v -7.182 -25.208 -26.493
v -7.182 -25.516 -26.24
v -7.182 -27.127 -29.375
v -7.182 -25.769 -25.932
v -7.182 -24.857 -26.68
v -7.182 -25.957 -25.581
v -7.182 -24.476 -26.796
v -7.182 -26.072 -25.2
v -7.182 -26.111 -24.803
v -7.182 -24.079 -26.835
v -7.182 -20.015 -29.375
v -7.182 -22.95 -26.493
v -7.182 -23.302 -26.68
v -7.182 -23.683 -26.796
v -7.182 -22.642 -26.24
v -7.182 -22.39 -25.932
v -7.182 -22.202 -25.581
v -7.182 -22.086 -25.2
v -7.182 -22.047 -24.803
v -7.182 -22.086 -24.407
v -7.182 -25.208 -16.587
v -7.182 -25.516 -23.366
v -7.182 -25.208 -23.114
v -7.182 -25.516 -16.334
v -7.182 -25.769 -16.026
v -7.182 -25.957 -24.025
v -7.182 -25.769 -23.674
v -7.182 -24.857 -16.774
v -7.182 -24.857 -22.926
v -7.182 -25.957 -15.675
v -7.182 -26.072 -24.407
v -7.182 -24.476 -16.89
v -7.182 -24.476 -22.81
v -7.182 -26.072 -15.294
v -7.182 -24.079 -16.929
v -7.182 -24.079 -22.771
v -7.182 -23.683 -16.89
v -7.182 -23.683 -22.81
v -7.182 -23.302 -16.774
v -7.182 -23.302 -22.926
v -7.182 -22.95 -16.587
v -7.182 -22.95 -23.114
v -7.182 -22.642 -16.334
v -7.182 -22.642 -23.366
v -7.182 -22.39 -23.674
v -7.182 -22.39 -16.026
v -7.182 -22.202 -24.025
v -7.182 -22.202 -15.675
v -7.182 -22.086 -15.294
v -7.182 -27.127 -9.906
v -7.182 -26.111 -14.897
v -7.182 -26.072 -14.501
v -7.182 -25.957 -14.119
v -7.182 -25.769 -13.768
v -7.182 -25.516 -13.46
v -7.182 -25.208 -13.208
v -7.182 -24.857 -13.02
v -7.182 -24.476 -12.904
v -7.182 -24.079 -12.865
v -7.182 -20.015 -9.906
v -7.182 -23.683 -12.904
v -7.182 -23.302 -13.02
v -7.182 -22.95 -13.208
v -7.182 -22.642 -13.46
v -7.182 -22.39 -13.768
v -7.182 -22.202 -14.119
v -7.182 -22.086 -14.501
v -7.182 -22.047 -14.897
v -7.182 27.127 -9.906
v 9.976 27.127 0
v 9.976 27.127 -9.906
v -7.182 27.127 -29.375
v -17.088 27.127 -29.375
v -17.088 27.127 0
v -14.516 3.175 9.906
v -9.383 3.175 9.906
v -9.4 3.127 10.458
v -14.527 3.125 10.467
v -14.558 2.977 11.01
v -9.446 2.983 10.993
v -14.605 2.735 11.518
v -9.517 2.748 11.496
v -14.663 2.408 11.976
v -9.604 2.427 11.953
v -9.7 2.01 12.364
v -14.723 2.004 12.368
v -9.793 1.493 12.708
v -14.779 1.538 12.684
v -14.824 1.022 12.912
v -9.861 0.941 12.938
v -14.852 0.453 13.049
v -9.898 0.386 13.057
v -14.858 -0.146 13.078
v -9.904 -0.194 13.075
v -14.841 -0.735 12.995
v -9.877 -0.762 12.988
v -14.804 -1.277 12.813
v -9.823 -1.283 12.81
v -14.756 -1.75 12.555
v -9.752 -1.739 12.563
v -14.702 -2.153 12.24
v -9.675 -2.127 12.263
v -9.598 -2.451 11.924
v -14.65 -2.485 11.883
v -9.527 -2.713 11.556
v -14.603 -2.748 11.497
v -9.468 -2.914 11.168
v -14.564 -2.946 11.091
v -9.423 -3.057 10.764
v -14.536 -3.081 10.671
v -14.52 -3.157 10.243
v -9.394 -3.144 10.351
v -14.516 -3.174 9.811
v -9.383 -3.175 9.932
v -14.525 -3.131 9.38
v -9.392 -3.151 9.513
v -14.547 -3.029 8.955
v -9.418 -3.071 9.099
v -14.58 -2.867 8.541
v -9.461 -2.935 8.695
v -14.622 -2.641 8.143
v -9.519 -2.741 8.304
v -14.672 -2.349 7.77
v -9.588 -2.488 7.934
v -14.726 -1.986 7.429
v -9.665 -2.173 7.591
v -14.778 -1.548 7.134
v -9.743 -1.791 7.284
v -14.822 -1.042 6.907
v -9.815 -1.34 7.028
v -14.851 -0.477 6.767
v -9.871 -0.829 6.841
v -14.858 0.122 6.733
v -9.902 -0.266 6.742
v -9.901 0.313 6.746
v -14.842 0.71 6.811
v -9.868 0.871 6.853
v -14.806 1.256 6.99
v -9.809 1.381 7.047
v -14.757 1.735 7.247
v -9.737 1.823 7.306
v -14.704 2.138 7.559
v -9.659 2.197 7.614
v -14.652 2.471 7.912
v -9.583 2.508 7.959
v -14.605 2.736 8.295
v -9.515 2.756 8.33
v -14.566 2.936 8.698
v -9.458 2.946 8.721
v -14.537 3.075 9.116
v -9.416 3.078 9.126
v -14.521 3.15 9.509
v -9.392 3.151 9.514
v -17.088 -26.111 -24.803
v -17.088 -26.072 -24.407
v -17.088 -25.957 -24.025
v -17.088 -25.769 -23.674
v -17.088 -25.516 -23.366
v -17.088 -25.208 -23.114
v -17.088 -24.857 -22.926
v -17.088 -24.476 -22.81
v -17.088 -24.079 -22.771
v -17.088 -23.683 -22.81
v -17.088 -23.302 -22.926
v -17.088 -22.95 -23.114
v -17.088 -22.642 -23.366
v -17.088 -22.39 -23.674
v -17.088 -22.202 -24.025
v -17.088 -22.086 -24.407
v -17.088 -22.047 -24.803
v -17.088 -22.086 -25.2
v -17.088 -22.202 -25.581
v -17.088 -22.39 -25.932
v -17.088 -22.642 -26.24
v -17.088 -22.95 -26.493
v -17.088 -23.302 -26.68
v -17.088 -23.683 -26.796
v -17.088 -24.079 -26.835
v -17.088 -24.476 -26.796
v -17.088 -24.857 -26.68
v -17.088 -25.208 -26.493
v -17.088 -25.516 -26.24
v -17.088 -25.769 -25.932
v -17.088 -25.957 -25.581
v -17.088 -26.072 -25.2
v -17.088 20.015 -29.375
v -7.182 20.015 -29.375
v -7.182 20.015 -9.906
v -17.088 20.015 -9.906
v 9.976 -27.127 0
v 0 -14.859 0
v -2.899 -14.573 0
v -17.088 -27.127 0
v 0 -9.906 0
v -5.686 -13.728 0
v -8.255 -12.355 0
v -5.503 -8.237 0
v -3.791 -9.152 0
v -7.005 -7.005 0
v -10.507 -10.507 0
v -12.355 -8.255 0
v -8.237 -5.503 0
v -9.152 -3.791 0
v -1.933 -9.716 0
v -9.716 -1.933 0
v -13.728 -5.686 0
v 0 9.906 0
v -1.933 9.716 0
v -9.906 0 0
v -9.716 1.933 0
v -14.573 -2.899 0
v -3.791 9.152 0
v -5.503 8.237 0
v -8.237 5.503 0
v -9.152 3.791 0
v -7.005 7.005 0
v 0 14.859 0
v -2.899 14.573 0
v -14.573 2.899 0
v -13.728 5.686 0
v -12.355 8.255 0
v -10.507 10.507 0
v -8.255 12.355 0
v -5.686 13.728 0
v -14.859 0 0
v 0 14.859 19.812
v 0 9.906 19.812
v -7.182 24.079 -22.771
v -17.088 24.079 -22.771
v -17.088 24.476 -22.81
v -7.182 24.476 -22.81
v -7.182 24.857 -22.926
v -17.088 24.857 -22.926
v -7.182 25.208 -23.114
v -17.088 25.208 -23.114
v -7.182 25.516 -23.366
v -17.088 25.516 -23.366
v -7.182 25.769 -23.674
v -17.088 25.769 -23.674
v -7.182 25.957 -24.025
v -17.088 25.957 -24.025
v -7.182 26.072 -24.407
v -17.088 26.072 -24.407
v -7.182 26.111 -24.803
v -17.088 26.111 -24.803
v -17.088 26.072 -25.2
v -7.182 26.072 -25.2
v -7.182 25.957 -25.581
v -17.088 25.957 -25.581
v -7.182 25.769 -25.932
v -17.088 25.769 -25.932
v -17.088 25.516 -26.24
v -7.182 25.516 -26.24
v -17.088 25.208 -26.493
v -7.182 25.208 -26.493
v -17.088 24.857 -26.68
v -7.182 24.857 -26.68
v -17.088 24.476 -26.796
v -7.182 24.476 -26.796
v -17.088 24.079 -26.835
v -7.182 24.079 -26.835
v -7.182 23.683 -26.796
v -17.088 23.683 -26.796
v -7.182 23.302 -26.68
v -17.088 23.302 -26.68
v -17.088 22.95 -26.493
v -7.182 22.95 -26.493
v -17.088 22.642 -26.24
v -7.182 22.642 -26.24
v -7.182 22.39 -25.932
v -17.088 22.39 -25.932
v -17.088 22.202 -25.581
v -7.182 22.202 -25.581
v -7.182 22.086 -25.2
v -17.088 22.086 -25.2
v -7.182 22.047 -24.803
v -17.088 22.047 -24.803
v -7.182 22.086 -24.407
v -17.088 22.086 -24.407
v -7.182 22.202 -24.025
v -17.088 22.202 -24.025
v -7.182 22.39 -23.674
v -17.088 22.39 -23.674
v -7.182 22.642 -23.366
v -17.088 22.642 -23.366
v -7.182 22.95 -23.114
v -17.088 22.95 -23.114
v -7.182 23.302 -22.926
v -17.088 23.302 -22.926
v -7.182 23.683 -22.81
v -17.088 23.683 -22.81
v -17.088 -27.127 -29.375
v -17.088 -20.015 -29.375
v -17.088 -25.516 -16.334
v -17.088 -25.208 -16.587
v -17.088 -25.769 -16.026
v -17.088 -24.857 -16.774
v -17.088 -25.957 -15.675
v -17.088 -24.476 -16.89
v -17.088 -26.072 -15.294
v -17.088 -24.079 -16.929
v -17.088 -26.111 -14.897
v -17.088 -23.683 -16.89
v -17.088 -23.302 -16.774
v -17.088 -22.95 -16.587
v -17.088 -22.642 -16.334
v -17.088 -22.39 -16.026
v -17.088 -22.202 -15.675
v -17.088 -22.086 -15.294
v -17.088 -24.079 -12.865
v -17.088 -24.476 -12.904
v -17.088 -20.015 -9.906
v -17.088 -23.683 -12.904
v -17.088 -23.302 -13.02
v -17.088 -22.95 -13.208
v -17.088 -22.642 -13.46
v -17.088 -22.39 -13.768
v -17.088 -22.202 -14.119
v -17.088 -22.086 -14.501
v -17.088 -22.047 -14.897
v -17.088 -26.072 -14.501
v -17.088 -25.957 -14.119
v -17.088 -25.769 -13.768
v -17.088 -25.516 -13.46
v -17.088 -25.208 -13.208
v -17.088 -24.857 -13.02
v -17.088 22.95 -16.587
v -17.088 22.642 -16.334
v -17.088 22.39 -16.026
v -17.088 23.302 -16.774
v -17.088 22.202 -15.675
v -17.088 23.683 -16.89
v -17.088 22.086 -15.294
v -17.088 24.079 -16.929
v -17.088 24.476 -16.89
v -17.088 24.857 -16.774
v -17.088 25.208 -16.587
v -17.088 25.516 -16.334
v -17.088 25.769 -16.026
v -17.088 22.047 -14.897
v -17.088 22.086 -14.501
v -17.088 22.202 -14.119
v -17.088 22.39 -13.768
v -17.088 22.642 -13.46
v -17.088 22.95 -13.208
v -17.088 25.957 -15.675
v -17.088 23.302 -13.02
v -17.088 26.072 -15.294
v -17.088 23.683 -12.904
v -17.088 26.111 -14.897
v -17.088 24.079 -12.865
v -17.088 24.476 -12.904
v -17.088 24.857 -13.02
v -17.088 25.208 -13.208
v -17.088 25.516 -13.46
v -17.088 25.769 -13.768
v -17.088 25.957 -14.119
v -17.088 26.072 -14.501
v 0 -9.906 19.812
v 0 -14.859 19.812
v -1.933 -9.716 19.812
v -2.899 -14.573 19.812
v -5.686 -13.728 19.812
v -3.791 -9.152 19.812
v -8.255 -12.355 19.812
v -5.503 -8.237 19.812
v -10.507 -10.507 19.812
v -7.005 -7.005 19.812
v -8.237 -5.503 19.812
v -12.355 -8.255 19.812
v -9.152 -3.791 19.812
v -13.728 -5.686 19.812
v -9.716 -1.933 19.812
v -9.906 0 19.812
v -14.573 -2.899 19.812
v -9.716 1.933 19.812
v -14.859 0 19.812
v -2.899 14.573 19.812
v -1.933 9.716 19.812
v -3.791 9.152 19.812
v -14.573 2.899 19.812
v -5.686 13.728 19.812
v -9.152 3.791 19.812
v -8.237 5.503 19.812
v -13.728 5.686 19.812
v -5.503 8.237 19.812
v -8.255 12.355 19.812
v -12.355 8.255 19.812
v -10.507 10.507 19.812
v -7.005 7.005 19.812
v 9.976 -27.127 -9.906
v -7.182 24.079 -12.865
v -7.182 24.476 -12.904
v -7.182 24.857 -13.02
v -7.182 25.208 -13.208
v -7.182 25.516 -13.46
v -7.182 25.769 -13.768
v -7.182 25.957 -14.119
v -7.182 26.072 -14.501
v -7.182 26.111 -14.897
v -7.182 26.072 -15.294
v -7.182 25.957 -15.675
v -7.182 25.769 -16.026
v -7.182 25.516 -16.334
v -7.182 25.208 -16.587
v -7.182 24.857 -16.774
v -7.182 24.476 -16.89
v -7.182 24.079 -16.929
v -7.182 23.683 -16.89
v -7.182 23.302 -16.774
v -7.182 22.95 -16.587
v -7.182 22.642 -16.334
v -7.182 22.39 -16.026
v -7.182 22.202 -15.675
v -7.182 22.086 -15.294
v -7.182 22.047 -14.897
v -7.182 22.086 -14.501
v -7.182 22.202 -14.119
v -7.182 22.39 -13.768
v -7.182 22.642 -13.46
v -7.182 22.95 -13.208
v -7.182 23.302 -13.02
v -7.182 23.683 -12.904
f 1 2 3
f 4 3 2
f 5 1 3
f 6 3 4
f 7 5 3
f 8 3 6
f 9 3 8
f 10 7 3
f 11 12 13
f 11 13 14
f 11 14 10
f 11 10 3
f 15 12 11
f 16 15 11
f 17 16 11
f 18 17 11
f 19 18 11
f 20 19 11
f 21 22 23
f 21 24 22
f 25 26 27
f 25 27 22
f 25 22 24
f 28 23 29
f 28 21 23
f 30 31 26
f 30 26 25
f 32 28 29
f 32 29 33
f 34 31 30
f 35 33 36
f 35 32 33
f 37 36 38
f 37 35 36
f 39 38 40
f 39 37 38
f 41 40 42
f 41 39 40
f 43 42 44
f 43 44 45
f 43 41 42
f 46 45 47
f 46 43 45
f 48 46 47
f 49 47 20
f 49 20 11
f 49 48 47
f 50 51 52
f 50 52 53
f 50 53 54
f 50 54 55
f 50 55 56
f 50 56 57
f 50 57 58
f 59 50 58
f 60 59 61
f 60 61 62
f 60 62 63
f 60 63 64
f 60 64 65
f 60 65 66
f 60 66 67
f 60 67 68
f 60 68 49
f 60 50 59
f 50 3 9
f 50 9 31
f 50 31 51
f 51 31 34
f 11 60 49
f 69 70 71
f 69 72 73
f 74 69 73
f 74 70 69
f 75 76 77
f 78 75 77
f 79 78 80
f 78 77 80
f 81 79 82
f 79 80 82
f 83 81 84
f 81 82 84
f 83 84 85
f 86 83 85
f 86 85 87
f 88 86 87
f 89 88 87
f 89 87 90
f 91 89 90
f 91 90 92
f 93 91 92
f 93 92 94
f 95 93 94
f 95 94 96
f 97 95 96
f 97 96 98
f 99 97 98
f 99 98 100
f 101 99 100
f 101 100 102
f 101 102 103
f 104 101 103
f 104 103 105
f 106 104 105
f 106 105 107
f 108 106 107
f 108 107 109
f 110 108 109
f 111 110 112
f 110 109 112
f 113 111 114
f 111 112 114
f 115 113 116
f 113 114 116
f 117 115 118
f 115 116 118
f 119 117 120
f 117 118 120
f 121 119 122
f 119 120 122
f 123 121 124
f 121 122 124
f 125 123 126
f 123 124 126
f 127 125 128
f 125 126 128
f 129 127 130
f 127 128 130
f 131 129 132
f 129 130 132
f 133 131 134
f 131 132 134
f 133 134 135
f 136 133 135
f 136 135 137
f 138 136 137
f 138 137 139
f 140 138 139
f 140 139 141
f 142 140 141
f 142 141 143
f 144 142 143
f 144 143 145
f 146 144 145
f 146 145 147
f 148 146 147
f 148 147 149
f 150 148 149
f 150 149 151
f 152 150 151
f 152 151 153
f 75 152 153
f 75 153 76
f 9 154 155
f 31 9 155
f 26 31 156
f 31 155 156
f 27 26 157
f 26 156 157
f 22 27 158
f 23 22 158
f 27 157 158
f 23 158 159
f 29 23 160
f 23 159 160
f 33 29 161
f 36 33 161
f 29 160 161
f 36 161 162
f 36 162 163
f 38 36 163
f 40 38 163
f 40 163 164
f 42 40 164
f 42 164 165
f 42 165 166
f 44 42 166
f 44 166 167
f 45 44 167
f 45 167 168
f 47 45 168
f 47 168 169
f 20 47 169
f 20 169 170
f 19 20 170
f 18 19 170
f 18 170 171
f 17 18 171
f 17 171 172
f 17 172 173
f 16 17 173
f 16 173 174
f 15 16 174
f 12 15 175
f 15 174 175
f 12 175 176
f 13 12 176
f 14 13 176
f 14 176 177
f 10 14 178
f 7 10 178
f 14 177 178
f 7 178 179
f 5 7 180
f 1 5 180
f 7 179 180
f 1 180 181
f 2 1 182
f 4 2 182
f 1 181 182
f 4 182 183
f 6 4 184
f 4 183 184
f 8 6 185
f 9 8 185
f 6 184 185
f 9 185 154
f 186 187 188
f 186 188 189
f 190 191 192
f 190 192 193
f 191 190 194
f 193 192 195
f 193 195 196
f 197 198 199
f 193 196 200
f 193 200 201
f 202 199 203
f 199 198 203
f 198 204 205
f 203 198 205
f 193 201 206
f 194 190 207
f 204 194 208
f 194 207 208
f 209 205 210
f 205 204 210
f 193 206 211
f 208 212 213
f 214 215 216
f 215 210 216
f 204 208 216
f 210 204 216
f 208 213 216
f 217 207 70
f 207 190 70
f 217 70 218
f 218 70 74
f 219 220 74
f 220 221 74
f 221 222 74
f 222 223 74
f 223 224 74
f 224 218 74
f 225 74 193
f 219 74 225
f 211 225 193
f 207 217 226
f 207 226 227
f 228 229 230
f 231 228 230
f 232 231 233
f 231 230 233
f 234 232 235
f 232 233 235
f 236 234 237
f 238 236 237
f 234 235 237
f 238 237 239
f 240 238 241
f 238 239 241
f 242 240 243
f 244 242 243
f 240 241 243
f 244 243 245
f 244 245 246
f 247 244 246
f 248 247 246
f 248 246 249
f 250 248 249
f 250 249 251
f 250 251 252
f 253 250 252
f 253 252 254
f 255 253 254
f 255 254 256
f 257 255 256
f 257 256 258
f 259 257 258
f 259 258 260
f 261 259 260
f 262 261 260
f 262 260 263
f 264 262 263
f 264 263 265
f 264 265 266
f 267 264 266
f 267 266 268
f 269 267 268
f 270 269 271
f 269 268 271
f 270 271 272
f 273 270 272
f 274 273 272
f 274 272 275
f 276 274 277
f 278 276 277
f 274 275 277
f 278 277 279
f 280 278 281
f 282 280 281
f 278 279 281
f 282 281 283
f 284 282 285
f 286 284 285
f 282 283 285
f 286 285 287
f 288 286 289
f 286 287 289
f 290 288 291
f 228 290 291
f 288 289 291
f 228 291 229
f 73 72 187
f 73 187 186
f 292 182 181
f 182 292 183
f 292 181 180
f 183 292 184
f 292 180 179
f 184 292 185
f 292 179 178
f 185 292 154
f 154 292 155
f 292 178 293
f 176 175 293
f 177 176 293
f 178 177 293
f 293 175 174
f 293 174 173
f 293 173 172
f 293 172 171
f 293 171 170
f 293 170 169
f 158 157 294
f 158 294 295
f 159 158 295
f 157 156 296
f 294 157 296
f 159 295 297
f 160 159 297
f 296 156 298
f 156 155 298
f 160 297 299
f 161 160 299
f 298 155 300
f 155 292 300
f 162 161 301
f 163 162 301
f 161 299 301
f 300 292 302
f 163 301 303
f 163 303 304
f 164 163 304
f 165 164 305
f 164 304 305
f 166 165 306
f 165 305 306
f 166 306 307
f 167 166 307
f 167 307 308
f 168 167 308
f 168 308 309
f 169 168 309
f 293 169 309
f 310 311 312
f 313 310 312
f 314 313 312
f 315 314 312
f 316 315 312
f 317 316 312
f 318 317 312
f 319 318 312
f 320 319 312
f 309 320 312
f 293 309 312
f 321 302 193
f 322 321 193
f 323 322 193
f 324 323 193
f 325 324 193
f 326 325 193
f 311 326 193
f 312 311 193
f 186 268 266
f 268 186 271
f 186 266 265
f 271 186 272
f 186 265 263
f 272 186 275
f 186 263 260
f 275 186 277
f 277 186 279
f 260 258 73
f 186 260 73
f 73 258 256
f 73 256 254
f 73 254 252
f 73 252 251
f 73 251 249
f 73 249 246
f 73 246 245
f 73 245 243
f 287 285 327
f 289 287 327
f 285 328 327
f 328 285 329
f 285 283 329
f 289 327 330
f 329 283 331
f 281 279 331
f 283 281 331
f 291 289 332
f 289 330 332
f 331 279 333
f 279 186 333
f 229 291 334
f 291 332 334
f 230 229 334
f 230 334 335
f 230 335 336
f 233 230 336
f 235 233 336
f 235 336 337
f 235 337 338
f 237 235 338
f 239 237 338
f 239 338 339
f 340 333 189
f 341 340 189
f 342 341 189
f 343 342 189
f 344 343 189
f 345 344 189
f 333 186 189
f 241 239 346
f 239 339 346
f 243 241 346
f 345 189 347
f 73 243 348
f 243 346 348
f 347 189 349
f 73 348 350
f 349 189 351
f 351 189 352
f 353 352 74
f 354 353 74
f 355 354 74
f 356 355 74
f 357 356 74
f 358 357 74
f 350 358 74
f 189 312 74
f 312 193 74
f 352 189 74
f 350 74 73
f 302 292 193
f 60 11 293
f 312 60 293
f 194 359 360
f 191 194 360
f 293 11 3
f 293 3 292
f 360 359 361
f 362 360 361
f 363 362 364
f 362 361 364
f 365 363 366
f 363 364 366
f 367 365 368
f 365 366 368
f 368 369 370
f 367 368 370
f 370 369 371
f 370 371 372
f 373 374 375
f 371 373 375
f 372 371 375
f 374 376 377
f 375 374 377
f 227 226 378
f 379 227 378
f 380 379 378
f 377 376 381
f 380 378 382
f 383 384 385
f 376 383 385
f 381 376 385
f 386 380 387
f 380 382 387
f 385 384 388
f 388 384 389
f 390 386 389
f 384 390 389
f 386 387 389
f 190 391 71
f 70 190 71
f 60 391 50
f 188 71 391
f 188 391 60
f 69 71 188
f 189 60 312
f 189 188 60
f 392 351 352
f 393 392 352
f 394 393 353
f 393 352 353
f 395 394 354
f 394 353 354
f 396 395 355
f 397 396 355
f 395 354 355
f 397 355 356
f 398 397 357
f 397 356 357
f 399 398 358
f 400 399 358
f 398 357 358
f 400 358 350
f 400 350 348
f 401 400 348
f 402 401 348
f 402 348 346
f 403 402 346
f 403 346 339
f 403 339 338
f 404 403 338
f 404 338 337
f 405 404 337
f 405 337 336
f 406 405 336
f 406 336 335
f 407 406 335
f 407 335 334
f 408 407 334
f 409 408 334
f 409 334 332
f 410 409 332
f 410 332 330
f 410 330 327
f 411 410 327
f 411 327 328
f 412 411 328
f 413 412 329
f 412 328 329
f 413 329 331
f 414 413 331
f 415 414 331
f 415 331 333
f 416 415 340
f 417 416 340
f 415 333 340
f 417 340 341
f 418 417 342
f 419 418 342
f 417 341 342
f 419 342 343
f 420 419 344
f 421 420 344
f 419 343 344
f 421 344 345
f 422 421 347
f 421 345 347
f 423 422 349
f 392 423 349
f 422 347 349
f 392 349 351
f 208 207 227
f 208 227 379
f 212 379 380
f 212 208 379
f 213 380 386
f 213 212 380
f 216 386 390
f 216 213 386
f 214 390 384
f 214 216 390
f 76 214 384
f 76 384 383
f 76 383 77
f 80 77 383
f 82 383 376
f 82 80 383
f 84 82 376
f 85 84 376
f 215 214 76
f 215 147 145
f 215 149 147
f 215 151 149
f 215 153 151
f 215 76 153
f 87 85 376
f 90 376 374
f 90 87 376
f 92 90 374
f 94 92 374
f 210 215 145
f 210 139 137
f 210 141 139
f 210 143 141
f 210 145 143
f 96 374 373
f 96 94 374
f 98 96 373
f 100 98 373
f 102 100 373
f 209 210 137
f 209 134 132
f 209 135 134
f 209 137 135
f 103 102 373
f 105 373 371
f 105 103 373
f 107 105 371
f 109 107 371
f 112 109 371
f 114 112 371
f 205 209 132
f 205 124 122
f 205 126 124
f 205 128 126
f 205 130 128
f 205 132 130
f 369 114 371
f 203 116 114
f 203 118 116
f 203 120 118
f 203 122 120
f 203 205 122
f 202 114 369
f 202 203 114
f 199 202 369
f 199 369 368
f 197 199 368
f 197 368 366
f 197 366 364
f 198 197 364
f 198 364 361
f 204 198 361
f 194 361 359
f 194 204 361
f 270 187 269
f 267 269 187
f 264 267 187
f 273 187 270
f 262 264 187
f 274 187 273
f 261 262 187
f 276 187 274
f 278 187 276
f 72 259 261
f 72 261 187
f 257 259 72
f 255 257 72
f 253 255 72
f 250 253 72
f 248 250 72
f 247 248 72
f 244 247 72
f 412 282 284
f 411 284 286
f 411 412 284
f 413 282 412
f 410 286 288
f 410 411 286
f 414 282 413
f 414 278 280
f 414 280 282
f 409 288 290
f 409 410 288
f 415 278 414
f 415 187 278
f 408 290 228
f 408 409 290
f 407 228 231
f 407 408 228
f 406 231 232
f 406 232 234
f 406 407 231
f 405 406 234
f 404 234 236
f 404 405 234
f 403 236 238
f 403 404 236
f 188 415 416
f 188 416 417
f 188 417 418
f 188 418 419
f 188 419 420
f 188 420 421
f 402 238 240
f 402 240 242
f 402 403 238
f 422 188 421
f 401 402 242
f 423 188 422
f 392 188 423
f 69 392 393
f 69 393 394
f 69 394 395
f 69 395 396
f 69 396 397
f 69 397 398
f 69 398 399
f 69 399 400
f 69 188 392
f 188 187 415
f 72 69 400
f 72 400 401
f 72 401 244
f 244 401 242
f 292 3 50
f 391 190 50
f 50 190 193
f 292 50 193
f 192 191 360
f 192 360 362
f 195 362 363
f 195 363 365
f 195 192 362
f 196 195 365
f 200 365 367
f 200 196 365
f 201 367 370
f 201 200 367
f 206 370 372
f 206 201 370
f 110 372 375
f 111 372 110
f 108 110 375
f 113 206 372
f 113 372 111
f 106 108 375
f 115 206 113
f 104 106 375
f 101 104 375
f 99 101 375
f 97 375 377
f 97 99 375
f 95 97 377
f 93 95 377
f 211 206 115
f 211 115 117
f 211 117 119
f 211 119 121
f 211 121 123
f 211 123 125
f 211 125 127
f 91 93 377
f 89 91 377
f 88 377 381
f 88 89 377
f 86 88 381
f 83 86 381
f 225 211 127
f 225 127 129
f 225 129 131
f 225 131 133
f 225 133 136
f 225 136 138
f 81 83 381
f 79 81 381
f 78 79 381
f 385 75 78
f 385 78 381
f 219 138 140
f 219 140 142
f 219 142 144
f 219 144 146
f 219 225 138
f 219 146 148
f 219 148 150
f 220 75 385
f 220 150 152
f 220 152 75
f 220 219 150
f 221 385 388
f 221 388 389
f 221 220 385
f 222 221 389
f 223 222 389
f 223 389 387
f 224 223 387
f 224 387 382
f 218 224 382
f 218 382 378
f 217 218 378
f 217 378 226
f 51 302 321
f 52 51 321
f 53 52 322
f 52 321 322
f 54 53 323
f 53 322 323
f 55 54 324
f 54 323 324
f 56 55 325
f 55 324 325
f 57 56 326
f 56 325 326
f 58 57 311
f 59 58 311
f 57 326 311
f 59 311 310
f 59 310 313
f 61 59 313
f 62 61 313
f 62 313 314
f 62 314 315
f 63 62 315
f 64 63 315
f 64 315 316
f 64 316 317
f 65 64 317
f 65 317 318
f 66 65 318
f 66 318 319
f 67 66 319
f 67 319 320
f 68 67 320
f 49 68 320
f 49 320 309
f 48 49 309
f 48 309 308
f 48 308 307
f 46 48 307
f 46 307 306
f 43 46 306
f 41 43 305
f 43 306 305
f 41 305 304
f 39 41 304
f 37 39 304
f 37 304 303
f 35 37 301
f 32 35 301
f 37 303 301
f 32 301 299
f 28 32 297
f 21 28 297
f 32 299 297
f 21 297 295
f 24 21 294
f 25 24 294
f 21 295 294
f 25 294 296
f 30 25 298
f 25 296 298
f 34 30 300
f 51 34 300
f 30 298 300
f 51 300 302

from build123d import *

# Parameters (mm, degrees)
BOSS_EXTRUDE1_DEPTH = 19.812
SKETCH2_R           = 3.175
CUT_EXTRUDE2_DEPTH  = 29.880704735
SKETCH3_W           = 34.1757
SKETCH3_H           = 54.2544
BOSS_EXTRUDE2_DEPTH = 9.906
SKETCH4_W           = 9.906
SKETCH4_H           = 7.112
BOSS_EXTRUDE3_DEPTH = 19.4691
SKETCH5_R           = 2.032
CUT_EXTRUDE3_DEPTH  = 53.599999528
SKETCH6_W           = 7.112
SKETCH6_H           = 54.2544
CUT_EXTRUDE4_DEPTH  = 44.715433515


with BuildPart() as part:
    # Sketch1 → Boss-Extrude1 (new body)
    with BuildSketch(Plane.XY):
        with BuildLine():
            Line((0, 14.859), (0, 9.906))
            ThreePointArc((0, 9.906), (-9.906, 0), (0, -9.906))
            Line((0, -9.906), (0, -14.859))
            ThreePointArc((0, -14.859), (-14.859, 0), (0, 14.859))
        make_face()
    extrude(amount=BOSS_EXTRUDE1_DEPTH)

    # Sketch2 → Cut-Extrude2 (cut, through all)
    with BuildSketch(Plane(origin=(0, 0, 0), x_dir=(0, 0, -1), z_dir=(1, 0, 0))):
        with Locations(Location((-9.906, 0, 0), (0, 0, 90))):
            Circle(SKETCH2_R)
    extrude(amount=-CUT_EXTRUDE2_DEPTH, mode=Mode.SUBTRACT)

    # Sketch3 → Boss-Extrude2 (add)
    with BuildSketch(Plane(origin=(0, 0, 0), x_dir=(-1, 0, 0), z_dir=(0, 0, -1))):
        Rectangle(SKETCH3_W, SKETCH3_H)
    extrude(amount=BOSS_EXTRUDE2_DEPTH)

    # Sketch4 → Boss-Extrude3 (add)
    with BuildSketch(Plane(origin=(0, 0, -9.906), x_dir=(-1, 0, 0), z_dir=(0, 0, -1))):
        with Locations((12.13485, -23.5712)):
            Rectangle(SKETCH4_W, SKETCH4_H)
        with Locations((12.13485, 23.5712)):
            Rectangle(SKETCH4_W, SKETCH4_H)
    extrude(amount=BOSS_EXTRUDE3_DEPTH)

    # Sketch5 → Cut-Extrude3 (cut, through all)
    with BuildSketch(Plane.ZY.offset(17.08785)):
        with Locations((-24.8031, 24.0792)):
            Circle(SKETCH5_R)
        with Locations((-14.8971, 24.0792)):
            Circle(SKETCH5_R)
        with Locations(Location((-14.8971, -24.0792, 0), (0, 0, 270))):
            Circle(SKETCH5_R)
        with Locations(Location((-24.8031, -24.0792, 0), (0, 0, 270))):
            Circle(SKETCH5_R)
    extrude(amount=-CUT_EXTRUDE3_DEPTH, mode=Mode.SUBTRACT)

    # Sketch6 → Cut-Extrude4 (cut, through all)
    with BuildSketch(Plane(origin=(0, 0, -9.906), x_dir=(-1, 0, 0), z_dir=(0, 0, -1))):
        with Locations((-13.53185, 0)):
            Rectangle(SKETCH6_W, SKETCH6_H)
    extrude(amount=-CUT_EXTRUDE4_DEPTH, mode=Mode.SUBTRACT)


solid = part.part
